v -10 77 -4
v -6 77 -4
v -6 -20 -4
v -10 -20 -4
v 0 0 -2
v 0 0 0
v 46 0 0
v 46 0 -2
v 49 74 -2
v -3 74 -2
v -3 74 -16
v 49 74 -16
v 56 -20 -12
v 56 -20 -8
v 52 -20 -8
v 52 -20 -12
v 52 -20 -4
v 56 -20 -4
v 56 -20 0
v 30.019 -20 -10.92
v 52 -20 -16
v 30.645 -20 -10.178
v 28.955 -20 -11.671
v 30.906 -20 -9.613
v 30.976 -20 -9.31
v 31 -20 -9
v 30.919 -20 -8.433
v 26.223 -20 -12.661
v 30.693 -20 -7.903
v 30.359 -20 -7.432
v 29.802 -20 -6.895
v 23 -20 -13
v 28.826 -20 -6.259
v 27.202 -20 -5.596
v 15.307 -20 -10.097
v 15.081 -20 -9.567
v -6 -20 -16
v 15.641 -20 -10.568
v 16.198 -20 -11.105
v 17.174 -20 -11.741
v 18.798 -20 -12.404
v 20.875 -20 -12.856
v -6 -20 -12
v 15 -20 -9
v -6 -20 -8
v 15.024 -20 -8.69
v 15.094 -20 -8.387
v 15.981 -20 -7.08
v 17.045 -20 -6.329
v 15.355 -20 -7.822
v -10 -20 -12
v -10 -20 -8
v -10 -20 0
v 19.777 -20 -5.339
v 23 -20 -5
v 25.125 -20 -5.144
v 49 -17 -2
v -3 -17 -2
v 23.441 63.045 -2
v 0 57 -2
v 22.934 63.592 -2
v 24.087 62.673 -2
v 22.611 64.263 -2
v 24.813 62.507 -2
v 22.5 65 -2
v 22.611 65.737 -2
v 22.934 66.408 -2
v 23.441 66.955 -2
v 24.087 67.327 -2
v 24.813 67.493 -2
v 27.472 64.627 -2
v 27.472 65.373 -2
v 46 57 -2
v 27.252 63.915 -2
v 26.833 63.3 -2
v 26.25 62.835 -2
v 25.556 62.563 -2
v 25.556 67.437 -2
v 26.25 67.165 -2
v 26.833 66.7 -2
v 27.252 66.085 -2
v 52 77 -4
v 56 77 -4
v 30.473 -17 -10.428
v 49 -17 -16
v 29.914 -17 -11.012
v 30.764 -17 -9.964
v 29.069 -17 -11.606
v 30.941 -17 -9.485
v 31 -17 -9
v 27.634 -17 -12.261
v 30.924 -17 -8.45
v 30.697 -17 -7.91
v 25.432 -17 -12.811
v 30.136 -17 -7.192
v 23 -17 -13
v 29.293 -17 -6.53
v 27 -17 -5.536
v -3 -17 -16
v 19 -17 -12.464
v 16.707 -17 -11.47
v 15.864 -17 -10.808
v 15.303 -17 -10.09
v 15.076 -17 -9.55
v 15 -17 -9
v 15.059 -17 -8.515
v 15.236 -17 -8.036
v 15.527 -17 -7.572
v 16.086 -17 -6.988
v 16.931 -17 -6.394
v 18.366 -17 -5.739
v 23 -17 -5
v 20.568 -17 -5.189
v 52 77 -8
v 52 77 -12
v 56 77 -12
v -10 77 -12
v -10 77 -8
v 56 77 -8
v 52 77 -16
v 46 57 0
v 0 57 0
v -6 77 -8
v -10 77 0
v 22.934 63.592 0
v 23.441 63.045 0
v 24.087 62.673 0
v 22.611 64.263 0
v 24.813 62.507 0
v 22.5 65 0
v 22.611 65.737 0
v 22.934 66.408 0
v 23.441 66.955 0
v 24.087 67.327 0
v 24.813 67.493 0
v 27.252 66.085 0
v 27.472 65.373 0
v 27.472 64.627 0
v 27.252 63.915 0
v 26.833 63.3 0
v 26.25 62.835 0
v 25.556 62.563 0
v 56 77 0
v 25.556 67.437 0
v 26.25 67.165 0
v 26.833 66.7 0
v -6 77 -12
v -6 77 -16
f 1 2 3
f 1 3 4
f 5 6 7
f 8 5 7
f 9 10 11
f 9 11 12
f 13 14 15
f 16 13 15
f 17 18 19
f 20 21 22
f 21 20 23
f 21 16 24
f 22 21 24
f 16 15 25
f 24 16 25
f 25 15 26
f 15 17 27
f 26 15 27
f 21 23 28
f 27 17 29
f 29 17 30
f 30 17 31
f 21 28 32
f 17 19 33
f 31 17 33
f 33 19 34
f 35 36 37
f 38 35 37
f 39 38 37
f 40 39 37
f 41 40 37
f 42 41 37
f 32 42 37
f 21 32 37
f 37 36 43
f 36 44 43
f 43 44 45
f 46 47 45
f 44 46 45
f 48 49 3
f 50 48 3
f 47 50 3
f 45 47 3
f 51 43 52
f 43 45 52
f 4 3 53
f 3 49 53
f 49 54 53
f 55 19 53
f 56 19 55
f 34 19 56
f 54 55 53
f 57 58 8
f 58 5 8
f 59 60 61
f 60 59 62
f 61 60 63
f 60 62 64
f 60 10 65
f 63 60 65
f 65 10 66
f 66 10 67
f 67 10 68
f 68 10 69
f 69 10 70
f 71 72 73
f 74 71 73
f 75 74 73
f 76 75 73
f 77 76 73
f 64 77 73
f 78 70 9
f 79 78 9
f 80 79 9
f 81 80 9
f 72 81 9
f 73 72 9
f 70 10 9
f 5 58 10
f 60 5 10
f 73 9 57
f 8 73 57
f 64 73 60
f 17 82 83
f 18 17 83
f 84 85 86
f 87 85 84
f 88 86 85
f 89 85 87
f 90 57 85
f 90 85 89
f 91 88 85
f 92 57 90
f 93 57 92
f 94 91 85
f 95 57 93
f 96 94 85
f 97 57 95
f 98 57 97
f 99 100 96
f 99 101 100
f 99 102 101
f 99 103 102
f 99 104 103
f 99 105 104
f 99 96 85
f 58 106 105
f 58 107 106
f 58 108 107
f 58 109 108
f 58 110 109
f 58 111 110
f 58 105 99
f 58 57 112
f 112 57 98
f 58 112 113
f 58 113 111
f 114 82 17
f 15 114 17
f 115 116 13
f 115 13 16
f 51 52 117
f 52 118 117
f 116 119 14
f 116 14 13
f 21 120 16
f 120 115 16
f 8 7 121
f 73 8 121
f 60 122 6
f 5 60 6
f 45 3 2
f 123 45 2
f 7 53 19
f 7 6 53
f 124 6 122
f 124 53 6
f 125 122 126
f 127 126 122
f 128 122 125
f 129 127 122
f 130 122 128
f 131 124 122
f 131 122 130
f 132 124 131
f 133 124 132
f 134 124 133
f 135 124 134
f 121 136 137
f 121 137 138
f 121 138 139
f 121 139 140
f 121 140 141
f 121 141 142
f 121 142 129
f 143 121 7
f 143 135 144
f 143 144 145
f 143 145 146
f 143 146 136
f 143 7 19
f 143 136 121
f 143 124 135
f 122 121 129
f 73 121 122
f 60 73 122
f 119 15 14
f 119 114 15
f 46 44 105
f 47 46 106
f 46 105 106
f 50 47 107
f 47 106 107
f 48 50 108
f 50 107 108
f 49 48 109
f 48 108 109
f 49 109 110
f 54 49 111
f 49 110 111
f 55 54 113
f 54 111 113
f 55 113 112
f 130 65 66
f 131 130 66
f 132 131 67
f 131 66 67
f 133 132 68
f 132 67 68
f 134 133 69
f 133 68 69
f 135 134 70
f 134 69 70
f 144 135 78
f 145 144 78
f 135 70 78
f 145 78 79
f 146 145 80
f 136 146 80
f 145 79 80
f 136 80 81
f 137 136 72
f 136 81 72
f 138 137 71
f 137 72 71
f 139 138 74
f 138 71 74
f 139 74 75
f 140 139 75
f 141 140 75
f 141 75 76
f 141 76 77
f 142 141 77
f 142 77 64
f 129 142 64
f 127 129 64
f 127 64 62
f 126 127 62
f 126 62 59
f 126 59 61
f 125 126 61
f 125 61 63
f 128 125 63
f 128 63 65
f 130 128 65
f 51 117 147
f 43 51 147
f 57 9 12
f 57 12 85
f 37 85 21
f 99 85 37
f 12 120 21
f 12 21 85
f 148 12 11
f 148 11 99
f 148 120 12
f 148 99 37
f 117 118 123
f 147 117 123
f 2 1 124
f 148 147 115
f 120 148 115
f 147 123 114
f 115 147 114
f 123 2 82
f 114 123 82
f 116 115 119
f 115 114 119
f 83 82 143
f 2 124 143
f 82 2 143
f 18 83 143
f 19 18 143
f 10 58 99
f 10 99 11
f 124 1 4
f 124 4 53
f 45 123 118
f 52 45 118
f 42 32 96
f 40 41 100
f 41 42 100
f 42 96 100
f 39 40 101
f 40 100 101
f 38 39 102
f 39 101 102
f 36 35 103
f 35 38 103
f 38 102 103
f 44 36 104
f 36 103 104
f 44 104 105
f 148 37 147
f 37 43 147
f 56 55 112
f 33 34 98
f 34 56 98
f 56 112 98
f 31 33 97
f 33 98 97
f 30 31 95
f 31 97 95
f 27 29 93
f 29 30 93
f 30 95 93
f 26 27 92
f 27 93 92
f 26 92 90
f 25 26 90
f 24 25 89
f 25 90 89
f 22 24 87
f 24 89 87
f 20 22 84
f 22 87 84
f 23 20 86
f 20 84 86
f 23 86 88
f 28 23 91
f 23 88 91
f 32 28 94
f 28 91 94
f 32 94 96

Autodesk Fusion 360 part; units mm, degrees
sketch "Boceto1" plane through (0, 0, 0) normal (0, 0, 1) x (1, 0, 0)
  line L0 (0, 0) -> (46, 0)
  line L1 (46, 0) -> (46, 57)
  line L2 (46, 57) -> (0, 57)
  line L3 (0, 57) -> (0, 0)
  line L4 (-6, 77) -> (52, 77)
  line L5 (52, 77) -> (52, -20)
  line L6 (52, -20) -> (-6, -20)
  line L7 (-6, -20) -> (-6, 77)
  dimension "d1" = 46
  dimension "d2" = 57
  dimension "d3" = 58
  dimension "d4" = 97
  dimension "d5" = 6
  dimension "d6" = 20
extrude "Extruir1" add sketch "Boceto1" against normal blind 2
sketch "Boceto2" plane through (0, 0, -2) normal (0, 0, -1) x (-1, 0, 0)
  line L0 (0, 57) -> (0, 0)
  line L1 (0, 0) -> (-46, 0)
  line L2 (-46, 0) -> (-46, 57)
  line L3 (-46, 57) -> (0, 57)
  line L4 (-52, -20) -> (6, -20)
  line L5 (6, -20) -> (6, 77)
  line L6 (6, 77) -> (-52, 77)
  line L7 (-52, 77) -> (-52, -20)
  line L8 (-46, 57) -> (0, 57)
  line L9 (0, 57) -> (0, 0)
  line L10 (0, 0) -> (-46, 0)
  line L11 (-46, 0) -> (-46, 57)
  line L12 (-49, -17) -> (3, -17)
  line L13 (3, -17) -> (3, 74)
  line L14 (3, 74) -> (-49, 74)
  line L15 (-49, 74) -> (-49, -17)
  circle A0 centre (-25, 65) radius 2.5
  dimension "d9" = -3
  dimension "d10" = 5
extrude "Extruir2" add sketch "Boceto2" along normal blind 14 contours L4 L5 L6 L7
sketch "Boceto3" plane through (0, -17, 0) normal (0, 1, 0) x (-1, 0, 0)
  line L0 (3, -2) -> (-49, -2)
  line L1 (-49, -2) -> (-49, -16)
  line L2 (-49, -16) -> (3, -16)
  line L3 (3, -16) -> (3, -2)
  line L4 (-23, -9) -> (-31, -9)
  ellipse E0 centre (-23, -9) end of major axis (-31, -9) minor radius 4
  line L5 (-15, -9) -> (-31, -9)
  line L6 (-23, -5) -> (-23, -13)
  dimension "d14" = 8
extrude "Extruir3" cut sketch "Boceto3" against normal blind 10 contours L4 E0 L5 L6 | E0 L5 L6 | L4 E0 L5 L6 | E0 L5 L6
extrude "Extruir4" cut sketch "Boceto2" against normal blind 10 contours A0
sketch "Boceto4" plane through (0, 77, 0) normal (0, 1, 0) x (-1, 0, 0)
  line L0 (6, 0) -> (-52, 0)
  line L1 (-52, 0) -> (-52, -16)
  line L2 (-52, -16) -> (6, -16)
  line L3 (6, -16) -> (6, 0)
  line L4 (-52, 0) -> (-52, -16)
  line L5 (-52, 0) -> (-56, 0)
  line L6 (-56, 0) -> (-52, 0)
  line L7 (-52, 0) -> (-52, -4)
  line L8 (-52, -4) -> (-56, -4)
  line L9 (-56, -4) -> (-56, 0)
  line L10 (-52, -4) -> (-52, -8)
  line L11 (-52, -8) -> (-56, -8)
  line L12 (-56, -8) -> (-56, -12)
  line L13 (-56, -12) -> (-52, -12)
  line L14 (-52, -12) -> (-52, -8)
  line L15 (-23, 0) -> (-23, -16)
  line L16 (6, -4) -> (10, -4)
  line L17 (6, 0) -> (10, 0)
  line L18 (10, -4) -> (10, 0)
  line L19 (6, -8) -> (10, -8)
  line L20 (10, -8) -> (10, -12)
  line L21 (10, -12) -> (6, -12)
  dimension "d19" = 4
  dimension "d20" = 4
  dimension "d21" = 4
  dimension "d22" = 4
  dimension "d23" = 4
  dimension "d24" = 4
extrude "Extruir5" add sketch "Boceto4" against normal blind 97 contours L3 L16 L17 L18 | L1 L4 L5 L6 L7 L8 L9 | L3 L19 L20 L21 | L1 L4 L11 L12 L13 L14
sketch "Boceto5" plane through (0, 77, 0) normal (0, 1, 0) x (-1, 0, 0)
  line L0 (10, 0) -> (-56, 0)
  line L1 (-56, 0) -> (-56, -4)
  line L2 (-56, -4) -> (-52, -4)
  line L3 (-52, -4) -> (-52, -8)
  line L4 (-52, -8) -> (-56, -8)
  line L5 (-56, -8) -> (-56, -12)
  line L6 (-56, -12) -> (-52, -12)
  line L7 (-52, -12) -> (-52, -16)
  line L8 (-52, -16) -> (6, -16)
  line L9 (6, -16) -> (6, -12)
  line L10 (6, -12) -> (10, -12)
  line L11 (10, -12) -> (10, -8)
  line L12 (10, -8) -> (6, -8)
  line L13 (6, -8) -> (6, -4)
  line L14 (6, -4) -> (10, -4)
  line L15 (10, -4) -> (10, 0)
